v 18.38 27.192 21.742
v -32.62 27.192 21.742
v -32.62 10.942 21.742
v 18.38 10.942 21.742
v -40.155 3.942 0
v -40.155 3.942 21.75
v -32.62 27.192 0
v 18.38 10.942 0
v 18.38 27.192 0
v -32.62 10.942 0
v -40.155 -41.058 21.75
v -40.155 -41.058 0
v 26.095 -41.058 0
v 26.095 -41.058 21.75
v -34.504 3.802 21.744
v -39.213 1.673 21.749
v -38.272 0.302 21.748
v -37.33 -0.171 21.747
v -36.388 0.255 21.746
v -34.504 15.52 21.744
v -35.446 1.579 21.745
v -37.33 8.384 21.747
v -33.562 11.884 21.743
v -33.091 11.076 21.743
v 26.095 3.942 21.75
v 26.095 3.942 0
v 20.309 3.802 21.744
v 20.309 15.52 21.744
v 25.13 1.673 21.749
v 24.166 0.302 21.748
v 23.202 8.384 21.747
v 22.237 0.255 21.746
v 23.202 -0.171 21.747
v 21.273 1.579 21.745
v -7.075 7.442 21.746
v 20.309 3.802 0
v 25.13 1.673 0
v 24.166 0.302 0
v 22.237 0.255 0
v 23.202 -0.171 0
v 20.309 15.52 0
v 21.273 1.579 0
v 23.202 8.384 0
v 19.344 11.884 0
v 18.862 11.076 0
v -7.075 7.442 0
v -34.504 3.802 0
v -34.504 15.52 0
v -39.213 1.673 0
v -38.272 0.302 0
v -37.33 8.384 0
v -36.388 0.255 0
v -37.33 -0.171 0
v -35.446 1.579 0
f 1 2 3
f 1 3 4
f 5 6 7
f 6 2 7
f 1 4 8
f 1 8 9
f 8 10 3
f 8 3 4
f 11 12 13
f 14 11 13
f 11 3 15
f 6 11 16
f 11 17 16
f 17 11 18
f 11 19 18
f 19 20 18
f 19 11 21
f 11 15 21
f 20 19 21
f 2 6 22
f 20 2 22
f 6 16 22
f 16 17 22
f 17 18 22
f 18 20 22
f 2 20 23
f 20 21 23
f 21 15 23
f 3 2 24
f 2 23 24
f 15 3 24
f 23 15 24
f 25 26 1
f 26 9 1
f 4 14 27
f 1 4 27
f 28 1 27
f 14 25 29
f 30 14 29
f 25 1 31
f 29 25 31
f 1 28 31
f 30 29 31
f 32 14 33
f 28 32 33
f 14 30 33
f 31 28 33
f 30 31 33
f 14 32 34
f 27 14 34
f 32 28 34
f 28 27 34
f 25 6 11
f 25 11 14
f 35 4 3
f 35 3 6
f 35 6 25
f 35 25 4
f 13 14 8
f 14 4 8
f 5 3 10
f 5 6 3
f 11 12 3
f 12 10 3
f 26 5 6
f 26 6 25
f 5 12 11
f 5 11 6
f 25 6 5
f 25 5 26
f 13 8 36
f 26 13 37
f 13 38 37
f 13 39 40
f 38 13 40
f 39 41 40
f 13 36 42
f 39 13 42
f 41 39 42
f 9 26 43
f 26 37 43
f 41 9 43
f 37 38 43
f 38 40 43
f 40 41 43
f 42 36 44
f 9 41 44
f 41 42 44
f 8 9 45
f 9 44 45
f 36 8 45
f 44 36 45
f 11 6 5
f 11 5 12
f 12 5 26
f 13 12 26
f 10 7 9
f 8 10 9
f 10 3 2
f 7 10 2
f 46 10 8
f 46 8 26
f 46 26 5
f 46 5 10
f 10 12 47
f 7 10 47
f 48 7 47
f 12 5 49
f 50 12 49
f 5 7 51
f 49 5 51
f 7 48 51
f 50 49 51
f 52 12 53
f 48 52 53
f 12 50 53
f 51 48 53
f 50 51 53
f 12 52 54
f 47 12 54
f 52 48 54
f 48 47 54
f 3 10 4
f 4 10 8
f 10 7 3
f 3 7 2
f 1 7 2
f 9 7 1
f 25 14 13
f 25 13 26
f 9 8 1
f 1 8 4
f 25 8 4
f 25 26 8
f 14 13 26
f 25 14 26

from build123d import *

# Parameters (mm, degrees)
F0_W       = 66.25
F0_H       = 45
F1_DEPTH   = 21.75
F2_W       = 51
F2_H       = 16.25
F3_DEPTH   = 21.7424
F1_FACE_W  = 45
F1_FACE_H  = 21.75
F3_FACE_W  = 16.25
F3_FACE_H  = 21.7424
F1_FACE1_W = 45
F1_FACE1_H = 21.75
F3_FACE1_W = 16.25
F3_FACE1_H = 21.7424
F3_FACE2_W = 51
F3_FACE2_H = 21.7424
F1_FACE2_W = 66.25
F1_FACE2_H = 21.75


with BuildPart() as f1:
    # F0 (on Top) → F1 (new body)
    with BuildSketch(Plane.XY):
        with Locations((-7.0303958654, -18.5577654839)):
            Rectangle(F0_W, F0_H)
    extrude(amount=F1_DEPTH)


with BuildPart() as f3:
    # F2 (on Top) → F3 (new body)
    with BuildSketch(Plane.XY):
        with Locations((-7.119971782, 19.0672345161)):
            Rectangle(F2_W, F2_H)
    extrude(amount=F3_DEPTH)


with BuildPart() as f4:
    # F1_face (on face) → F4 section 0
    with BuildSketch(Plane(origin=(-40.1553958654, -18.5577654839, 10.875), x_dir=(0, -1, 0), z_dir=(-1, 0, 0))):
        Rectangle(F1_FACE_W, F1_FACE_H)
    # F3_face (on face) → F4 section 1
    with BuildSketch(Plane(origin=(-32.619971782, 19.0672345161, 10.8712), x_dir=(0, -1, 0), z_dir=(-1, 0, 0))):
        Rectangle(F3_FACE_W, F3_FACE_H)
    loft()


with BuildPart() as f5:
    # F1_face1 (on face) → F5 section 0
    with BuildSketch(Plane(origin=(26.0946041346, -18.5577654839, 10.875), x_dir=(0, 1, 0), z_dir=(1, 0, 0))):
        Rectangle(F1_FACE1_W, F1_FACE1_H)
    # F3_face1 (on face) → F5 section 1
    with BuildSketch(Plane(origin=(18.380028218, 19.0672345161, 10.8712), x_dir=(0, 1, 0), z_dir=(1, 0, 0))):
        Rectangle(F3_FACE1_W, F3_FACE1_H)
    loft()


with BuildPart() as f6:
    # F3_face2 (on face) → F6 section 0
    with BuildSketch(Plane(origin=(-7.119971782, 10.9422345161, 10.8712), x_dir=(1, 0, 0), z_dir=(0, -1, 0))):
        Rectangle(F3_FACE2_W, F3_FACE2_H)
    # F1_face2 (on face) → F6 section 1
    with BuildSketch(Plane(origin=(-7.0303958654, 3.9422345161, 10.875), x_dir=(-1, 0, 0), z_dir=(0, 1, 0))):
        Rectangle(F1_FACE2_W, F1_FACE2_H)
    loft()


solid = Compound([f1.part, f3.part, f4.part, f5.part, f6.part])
